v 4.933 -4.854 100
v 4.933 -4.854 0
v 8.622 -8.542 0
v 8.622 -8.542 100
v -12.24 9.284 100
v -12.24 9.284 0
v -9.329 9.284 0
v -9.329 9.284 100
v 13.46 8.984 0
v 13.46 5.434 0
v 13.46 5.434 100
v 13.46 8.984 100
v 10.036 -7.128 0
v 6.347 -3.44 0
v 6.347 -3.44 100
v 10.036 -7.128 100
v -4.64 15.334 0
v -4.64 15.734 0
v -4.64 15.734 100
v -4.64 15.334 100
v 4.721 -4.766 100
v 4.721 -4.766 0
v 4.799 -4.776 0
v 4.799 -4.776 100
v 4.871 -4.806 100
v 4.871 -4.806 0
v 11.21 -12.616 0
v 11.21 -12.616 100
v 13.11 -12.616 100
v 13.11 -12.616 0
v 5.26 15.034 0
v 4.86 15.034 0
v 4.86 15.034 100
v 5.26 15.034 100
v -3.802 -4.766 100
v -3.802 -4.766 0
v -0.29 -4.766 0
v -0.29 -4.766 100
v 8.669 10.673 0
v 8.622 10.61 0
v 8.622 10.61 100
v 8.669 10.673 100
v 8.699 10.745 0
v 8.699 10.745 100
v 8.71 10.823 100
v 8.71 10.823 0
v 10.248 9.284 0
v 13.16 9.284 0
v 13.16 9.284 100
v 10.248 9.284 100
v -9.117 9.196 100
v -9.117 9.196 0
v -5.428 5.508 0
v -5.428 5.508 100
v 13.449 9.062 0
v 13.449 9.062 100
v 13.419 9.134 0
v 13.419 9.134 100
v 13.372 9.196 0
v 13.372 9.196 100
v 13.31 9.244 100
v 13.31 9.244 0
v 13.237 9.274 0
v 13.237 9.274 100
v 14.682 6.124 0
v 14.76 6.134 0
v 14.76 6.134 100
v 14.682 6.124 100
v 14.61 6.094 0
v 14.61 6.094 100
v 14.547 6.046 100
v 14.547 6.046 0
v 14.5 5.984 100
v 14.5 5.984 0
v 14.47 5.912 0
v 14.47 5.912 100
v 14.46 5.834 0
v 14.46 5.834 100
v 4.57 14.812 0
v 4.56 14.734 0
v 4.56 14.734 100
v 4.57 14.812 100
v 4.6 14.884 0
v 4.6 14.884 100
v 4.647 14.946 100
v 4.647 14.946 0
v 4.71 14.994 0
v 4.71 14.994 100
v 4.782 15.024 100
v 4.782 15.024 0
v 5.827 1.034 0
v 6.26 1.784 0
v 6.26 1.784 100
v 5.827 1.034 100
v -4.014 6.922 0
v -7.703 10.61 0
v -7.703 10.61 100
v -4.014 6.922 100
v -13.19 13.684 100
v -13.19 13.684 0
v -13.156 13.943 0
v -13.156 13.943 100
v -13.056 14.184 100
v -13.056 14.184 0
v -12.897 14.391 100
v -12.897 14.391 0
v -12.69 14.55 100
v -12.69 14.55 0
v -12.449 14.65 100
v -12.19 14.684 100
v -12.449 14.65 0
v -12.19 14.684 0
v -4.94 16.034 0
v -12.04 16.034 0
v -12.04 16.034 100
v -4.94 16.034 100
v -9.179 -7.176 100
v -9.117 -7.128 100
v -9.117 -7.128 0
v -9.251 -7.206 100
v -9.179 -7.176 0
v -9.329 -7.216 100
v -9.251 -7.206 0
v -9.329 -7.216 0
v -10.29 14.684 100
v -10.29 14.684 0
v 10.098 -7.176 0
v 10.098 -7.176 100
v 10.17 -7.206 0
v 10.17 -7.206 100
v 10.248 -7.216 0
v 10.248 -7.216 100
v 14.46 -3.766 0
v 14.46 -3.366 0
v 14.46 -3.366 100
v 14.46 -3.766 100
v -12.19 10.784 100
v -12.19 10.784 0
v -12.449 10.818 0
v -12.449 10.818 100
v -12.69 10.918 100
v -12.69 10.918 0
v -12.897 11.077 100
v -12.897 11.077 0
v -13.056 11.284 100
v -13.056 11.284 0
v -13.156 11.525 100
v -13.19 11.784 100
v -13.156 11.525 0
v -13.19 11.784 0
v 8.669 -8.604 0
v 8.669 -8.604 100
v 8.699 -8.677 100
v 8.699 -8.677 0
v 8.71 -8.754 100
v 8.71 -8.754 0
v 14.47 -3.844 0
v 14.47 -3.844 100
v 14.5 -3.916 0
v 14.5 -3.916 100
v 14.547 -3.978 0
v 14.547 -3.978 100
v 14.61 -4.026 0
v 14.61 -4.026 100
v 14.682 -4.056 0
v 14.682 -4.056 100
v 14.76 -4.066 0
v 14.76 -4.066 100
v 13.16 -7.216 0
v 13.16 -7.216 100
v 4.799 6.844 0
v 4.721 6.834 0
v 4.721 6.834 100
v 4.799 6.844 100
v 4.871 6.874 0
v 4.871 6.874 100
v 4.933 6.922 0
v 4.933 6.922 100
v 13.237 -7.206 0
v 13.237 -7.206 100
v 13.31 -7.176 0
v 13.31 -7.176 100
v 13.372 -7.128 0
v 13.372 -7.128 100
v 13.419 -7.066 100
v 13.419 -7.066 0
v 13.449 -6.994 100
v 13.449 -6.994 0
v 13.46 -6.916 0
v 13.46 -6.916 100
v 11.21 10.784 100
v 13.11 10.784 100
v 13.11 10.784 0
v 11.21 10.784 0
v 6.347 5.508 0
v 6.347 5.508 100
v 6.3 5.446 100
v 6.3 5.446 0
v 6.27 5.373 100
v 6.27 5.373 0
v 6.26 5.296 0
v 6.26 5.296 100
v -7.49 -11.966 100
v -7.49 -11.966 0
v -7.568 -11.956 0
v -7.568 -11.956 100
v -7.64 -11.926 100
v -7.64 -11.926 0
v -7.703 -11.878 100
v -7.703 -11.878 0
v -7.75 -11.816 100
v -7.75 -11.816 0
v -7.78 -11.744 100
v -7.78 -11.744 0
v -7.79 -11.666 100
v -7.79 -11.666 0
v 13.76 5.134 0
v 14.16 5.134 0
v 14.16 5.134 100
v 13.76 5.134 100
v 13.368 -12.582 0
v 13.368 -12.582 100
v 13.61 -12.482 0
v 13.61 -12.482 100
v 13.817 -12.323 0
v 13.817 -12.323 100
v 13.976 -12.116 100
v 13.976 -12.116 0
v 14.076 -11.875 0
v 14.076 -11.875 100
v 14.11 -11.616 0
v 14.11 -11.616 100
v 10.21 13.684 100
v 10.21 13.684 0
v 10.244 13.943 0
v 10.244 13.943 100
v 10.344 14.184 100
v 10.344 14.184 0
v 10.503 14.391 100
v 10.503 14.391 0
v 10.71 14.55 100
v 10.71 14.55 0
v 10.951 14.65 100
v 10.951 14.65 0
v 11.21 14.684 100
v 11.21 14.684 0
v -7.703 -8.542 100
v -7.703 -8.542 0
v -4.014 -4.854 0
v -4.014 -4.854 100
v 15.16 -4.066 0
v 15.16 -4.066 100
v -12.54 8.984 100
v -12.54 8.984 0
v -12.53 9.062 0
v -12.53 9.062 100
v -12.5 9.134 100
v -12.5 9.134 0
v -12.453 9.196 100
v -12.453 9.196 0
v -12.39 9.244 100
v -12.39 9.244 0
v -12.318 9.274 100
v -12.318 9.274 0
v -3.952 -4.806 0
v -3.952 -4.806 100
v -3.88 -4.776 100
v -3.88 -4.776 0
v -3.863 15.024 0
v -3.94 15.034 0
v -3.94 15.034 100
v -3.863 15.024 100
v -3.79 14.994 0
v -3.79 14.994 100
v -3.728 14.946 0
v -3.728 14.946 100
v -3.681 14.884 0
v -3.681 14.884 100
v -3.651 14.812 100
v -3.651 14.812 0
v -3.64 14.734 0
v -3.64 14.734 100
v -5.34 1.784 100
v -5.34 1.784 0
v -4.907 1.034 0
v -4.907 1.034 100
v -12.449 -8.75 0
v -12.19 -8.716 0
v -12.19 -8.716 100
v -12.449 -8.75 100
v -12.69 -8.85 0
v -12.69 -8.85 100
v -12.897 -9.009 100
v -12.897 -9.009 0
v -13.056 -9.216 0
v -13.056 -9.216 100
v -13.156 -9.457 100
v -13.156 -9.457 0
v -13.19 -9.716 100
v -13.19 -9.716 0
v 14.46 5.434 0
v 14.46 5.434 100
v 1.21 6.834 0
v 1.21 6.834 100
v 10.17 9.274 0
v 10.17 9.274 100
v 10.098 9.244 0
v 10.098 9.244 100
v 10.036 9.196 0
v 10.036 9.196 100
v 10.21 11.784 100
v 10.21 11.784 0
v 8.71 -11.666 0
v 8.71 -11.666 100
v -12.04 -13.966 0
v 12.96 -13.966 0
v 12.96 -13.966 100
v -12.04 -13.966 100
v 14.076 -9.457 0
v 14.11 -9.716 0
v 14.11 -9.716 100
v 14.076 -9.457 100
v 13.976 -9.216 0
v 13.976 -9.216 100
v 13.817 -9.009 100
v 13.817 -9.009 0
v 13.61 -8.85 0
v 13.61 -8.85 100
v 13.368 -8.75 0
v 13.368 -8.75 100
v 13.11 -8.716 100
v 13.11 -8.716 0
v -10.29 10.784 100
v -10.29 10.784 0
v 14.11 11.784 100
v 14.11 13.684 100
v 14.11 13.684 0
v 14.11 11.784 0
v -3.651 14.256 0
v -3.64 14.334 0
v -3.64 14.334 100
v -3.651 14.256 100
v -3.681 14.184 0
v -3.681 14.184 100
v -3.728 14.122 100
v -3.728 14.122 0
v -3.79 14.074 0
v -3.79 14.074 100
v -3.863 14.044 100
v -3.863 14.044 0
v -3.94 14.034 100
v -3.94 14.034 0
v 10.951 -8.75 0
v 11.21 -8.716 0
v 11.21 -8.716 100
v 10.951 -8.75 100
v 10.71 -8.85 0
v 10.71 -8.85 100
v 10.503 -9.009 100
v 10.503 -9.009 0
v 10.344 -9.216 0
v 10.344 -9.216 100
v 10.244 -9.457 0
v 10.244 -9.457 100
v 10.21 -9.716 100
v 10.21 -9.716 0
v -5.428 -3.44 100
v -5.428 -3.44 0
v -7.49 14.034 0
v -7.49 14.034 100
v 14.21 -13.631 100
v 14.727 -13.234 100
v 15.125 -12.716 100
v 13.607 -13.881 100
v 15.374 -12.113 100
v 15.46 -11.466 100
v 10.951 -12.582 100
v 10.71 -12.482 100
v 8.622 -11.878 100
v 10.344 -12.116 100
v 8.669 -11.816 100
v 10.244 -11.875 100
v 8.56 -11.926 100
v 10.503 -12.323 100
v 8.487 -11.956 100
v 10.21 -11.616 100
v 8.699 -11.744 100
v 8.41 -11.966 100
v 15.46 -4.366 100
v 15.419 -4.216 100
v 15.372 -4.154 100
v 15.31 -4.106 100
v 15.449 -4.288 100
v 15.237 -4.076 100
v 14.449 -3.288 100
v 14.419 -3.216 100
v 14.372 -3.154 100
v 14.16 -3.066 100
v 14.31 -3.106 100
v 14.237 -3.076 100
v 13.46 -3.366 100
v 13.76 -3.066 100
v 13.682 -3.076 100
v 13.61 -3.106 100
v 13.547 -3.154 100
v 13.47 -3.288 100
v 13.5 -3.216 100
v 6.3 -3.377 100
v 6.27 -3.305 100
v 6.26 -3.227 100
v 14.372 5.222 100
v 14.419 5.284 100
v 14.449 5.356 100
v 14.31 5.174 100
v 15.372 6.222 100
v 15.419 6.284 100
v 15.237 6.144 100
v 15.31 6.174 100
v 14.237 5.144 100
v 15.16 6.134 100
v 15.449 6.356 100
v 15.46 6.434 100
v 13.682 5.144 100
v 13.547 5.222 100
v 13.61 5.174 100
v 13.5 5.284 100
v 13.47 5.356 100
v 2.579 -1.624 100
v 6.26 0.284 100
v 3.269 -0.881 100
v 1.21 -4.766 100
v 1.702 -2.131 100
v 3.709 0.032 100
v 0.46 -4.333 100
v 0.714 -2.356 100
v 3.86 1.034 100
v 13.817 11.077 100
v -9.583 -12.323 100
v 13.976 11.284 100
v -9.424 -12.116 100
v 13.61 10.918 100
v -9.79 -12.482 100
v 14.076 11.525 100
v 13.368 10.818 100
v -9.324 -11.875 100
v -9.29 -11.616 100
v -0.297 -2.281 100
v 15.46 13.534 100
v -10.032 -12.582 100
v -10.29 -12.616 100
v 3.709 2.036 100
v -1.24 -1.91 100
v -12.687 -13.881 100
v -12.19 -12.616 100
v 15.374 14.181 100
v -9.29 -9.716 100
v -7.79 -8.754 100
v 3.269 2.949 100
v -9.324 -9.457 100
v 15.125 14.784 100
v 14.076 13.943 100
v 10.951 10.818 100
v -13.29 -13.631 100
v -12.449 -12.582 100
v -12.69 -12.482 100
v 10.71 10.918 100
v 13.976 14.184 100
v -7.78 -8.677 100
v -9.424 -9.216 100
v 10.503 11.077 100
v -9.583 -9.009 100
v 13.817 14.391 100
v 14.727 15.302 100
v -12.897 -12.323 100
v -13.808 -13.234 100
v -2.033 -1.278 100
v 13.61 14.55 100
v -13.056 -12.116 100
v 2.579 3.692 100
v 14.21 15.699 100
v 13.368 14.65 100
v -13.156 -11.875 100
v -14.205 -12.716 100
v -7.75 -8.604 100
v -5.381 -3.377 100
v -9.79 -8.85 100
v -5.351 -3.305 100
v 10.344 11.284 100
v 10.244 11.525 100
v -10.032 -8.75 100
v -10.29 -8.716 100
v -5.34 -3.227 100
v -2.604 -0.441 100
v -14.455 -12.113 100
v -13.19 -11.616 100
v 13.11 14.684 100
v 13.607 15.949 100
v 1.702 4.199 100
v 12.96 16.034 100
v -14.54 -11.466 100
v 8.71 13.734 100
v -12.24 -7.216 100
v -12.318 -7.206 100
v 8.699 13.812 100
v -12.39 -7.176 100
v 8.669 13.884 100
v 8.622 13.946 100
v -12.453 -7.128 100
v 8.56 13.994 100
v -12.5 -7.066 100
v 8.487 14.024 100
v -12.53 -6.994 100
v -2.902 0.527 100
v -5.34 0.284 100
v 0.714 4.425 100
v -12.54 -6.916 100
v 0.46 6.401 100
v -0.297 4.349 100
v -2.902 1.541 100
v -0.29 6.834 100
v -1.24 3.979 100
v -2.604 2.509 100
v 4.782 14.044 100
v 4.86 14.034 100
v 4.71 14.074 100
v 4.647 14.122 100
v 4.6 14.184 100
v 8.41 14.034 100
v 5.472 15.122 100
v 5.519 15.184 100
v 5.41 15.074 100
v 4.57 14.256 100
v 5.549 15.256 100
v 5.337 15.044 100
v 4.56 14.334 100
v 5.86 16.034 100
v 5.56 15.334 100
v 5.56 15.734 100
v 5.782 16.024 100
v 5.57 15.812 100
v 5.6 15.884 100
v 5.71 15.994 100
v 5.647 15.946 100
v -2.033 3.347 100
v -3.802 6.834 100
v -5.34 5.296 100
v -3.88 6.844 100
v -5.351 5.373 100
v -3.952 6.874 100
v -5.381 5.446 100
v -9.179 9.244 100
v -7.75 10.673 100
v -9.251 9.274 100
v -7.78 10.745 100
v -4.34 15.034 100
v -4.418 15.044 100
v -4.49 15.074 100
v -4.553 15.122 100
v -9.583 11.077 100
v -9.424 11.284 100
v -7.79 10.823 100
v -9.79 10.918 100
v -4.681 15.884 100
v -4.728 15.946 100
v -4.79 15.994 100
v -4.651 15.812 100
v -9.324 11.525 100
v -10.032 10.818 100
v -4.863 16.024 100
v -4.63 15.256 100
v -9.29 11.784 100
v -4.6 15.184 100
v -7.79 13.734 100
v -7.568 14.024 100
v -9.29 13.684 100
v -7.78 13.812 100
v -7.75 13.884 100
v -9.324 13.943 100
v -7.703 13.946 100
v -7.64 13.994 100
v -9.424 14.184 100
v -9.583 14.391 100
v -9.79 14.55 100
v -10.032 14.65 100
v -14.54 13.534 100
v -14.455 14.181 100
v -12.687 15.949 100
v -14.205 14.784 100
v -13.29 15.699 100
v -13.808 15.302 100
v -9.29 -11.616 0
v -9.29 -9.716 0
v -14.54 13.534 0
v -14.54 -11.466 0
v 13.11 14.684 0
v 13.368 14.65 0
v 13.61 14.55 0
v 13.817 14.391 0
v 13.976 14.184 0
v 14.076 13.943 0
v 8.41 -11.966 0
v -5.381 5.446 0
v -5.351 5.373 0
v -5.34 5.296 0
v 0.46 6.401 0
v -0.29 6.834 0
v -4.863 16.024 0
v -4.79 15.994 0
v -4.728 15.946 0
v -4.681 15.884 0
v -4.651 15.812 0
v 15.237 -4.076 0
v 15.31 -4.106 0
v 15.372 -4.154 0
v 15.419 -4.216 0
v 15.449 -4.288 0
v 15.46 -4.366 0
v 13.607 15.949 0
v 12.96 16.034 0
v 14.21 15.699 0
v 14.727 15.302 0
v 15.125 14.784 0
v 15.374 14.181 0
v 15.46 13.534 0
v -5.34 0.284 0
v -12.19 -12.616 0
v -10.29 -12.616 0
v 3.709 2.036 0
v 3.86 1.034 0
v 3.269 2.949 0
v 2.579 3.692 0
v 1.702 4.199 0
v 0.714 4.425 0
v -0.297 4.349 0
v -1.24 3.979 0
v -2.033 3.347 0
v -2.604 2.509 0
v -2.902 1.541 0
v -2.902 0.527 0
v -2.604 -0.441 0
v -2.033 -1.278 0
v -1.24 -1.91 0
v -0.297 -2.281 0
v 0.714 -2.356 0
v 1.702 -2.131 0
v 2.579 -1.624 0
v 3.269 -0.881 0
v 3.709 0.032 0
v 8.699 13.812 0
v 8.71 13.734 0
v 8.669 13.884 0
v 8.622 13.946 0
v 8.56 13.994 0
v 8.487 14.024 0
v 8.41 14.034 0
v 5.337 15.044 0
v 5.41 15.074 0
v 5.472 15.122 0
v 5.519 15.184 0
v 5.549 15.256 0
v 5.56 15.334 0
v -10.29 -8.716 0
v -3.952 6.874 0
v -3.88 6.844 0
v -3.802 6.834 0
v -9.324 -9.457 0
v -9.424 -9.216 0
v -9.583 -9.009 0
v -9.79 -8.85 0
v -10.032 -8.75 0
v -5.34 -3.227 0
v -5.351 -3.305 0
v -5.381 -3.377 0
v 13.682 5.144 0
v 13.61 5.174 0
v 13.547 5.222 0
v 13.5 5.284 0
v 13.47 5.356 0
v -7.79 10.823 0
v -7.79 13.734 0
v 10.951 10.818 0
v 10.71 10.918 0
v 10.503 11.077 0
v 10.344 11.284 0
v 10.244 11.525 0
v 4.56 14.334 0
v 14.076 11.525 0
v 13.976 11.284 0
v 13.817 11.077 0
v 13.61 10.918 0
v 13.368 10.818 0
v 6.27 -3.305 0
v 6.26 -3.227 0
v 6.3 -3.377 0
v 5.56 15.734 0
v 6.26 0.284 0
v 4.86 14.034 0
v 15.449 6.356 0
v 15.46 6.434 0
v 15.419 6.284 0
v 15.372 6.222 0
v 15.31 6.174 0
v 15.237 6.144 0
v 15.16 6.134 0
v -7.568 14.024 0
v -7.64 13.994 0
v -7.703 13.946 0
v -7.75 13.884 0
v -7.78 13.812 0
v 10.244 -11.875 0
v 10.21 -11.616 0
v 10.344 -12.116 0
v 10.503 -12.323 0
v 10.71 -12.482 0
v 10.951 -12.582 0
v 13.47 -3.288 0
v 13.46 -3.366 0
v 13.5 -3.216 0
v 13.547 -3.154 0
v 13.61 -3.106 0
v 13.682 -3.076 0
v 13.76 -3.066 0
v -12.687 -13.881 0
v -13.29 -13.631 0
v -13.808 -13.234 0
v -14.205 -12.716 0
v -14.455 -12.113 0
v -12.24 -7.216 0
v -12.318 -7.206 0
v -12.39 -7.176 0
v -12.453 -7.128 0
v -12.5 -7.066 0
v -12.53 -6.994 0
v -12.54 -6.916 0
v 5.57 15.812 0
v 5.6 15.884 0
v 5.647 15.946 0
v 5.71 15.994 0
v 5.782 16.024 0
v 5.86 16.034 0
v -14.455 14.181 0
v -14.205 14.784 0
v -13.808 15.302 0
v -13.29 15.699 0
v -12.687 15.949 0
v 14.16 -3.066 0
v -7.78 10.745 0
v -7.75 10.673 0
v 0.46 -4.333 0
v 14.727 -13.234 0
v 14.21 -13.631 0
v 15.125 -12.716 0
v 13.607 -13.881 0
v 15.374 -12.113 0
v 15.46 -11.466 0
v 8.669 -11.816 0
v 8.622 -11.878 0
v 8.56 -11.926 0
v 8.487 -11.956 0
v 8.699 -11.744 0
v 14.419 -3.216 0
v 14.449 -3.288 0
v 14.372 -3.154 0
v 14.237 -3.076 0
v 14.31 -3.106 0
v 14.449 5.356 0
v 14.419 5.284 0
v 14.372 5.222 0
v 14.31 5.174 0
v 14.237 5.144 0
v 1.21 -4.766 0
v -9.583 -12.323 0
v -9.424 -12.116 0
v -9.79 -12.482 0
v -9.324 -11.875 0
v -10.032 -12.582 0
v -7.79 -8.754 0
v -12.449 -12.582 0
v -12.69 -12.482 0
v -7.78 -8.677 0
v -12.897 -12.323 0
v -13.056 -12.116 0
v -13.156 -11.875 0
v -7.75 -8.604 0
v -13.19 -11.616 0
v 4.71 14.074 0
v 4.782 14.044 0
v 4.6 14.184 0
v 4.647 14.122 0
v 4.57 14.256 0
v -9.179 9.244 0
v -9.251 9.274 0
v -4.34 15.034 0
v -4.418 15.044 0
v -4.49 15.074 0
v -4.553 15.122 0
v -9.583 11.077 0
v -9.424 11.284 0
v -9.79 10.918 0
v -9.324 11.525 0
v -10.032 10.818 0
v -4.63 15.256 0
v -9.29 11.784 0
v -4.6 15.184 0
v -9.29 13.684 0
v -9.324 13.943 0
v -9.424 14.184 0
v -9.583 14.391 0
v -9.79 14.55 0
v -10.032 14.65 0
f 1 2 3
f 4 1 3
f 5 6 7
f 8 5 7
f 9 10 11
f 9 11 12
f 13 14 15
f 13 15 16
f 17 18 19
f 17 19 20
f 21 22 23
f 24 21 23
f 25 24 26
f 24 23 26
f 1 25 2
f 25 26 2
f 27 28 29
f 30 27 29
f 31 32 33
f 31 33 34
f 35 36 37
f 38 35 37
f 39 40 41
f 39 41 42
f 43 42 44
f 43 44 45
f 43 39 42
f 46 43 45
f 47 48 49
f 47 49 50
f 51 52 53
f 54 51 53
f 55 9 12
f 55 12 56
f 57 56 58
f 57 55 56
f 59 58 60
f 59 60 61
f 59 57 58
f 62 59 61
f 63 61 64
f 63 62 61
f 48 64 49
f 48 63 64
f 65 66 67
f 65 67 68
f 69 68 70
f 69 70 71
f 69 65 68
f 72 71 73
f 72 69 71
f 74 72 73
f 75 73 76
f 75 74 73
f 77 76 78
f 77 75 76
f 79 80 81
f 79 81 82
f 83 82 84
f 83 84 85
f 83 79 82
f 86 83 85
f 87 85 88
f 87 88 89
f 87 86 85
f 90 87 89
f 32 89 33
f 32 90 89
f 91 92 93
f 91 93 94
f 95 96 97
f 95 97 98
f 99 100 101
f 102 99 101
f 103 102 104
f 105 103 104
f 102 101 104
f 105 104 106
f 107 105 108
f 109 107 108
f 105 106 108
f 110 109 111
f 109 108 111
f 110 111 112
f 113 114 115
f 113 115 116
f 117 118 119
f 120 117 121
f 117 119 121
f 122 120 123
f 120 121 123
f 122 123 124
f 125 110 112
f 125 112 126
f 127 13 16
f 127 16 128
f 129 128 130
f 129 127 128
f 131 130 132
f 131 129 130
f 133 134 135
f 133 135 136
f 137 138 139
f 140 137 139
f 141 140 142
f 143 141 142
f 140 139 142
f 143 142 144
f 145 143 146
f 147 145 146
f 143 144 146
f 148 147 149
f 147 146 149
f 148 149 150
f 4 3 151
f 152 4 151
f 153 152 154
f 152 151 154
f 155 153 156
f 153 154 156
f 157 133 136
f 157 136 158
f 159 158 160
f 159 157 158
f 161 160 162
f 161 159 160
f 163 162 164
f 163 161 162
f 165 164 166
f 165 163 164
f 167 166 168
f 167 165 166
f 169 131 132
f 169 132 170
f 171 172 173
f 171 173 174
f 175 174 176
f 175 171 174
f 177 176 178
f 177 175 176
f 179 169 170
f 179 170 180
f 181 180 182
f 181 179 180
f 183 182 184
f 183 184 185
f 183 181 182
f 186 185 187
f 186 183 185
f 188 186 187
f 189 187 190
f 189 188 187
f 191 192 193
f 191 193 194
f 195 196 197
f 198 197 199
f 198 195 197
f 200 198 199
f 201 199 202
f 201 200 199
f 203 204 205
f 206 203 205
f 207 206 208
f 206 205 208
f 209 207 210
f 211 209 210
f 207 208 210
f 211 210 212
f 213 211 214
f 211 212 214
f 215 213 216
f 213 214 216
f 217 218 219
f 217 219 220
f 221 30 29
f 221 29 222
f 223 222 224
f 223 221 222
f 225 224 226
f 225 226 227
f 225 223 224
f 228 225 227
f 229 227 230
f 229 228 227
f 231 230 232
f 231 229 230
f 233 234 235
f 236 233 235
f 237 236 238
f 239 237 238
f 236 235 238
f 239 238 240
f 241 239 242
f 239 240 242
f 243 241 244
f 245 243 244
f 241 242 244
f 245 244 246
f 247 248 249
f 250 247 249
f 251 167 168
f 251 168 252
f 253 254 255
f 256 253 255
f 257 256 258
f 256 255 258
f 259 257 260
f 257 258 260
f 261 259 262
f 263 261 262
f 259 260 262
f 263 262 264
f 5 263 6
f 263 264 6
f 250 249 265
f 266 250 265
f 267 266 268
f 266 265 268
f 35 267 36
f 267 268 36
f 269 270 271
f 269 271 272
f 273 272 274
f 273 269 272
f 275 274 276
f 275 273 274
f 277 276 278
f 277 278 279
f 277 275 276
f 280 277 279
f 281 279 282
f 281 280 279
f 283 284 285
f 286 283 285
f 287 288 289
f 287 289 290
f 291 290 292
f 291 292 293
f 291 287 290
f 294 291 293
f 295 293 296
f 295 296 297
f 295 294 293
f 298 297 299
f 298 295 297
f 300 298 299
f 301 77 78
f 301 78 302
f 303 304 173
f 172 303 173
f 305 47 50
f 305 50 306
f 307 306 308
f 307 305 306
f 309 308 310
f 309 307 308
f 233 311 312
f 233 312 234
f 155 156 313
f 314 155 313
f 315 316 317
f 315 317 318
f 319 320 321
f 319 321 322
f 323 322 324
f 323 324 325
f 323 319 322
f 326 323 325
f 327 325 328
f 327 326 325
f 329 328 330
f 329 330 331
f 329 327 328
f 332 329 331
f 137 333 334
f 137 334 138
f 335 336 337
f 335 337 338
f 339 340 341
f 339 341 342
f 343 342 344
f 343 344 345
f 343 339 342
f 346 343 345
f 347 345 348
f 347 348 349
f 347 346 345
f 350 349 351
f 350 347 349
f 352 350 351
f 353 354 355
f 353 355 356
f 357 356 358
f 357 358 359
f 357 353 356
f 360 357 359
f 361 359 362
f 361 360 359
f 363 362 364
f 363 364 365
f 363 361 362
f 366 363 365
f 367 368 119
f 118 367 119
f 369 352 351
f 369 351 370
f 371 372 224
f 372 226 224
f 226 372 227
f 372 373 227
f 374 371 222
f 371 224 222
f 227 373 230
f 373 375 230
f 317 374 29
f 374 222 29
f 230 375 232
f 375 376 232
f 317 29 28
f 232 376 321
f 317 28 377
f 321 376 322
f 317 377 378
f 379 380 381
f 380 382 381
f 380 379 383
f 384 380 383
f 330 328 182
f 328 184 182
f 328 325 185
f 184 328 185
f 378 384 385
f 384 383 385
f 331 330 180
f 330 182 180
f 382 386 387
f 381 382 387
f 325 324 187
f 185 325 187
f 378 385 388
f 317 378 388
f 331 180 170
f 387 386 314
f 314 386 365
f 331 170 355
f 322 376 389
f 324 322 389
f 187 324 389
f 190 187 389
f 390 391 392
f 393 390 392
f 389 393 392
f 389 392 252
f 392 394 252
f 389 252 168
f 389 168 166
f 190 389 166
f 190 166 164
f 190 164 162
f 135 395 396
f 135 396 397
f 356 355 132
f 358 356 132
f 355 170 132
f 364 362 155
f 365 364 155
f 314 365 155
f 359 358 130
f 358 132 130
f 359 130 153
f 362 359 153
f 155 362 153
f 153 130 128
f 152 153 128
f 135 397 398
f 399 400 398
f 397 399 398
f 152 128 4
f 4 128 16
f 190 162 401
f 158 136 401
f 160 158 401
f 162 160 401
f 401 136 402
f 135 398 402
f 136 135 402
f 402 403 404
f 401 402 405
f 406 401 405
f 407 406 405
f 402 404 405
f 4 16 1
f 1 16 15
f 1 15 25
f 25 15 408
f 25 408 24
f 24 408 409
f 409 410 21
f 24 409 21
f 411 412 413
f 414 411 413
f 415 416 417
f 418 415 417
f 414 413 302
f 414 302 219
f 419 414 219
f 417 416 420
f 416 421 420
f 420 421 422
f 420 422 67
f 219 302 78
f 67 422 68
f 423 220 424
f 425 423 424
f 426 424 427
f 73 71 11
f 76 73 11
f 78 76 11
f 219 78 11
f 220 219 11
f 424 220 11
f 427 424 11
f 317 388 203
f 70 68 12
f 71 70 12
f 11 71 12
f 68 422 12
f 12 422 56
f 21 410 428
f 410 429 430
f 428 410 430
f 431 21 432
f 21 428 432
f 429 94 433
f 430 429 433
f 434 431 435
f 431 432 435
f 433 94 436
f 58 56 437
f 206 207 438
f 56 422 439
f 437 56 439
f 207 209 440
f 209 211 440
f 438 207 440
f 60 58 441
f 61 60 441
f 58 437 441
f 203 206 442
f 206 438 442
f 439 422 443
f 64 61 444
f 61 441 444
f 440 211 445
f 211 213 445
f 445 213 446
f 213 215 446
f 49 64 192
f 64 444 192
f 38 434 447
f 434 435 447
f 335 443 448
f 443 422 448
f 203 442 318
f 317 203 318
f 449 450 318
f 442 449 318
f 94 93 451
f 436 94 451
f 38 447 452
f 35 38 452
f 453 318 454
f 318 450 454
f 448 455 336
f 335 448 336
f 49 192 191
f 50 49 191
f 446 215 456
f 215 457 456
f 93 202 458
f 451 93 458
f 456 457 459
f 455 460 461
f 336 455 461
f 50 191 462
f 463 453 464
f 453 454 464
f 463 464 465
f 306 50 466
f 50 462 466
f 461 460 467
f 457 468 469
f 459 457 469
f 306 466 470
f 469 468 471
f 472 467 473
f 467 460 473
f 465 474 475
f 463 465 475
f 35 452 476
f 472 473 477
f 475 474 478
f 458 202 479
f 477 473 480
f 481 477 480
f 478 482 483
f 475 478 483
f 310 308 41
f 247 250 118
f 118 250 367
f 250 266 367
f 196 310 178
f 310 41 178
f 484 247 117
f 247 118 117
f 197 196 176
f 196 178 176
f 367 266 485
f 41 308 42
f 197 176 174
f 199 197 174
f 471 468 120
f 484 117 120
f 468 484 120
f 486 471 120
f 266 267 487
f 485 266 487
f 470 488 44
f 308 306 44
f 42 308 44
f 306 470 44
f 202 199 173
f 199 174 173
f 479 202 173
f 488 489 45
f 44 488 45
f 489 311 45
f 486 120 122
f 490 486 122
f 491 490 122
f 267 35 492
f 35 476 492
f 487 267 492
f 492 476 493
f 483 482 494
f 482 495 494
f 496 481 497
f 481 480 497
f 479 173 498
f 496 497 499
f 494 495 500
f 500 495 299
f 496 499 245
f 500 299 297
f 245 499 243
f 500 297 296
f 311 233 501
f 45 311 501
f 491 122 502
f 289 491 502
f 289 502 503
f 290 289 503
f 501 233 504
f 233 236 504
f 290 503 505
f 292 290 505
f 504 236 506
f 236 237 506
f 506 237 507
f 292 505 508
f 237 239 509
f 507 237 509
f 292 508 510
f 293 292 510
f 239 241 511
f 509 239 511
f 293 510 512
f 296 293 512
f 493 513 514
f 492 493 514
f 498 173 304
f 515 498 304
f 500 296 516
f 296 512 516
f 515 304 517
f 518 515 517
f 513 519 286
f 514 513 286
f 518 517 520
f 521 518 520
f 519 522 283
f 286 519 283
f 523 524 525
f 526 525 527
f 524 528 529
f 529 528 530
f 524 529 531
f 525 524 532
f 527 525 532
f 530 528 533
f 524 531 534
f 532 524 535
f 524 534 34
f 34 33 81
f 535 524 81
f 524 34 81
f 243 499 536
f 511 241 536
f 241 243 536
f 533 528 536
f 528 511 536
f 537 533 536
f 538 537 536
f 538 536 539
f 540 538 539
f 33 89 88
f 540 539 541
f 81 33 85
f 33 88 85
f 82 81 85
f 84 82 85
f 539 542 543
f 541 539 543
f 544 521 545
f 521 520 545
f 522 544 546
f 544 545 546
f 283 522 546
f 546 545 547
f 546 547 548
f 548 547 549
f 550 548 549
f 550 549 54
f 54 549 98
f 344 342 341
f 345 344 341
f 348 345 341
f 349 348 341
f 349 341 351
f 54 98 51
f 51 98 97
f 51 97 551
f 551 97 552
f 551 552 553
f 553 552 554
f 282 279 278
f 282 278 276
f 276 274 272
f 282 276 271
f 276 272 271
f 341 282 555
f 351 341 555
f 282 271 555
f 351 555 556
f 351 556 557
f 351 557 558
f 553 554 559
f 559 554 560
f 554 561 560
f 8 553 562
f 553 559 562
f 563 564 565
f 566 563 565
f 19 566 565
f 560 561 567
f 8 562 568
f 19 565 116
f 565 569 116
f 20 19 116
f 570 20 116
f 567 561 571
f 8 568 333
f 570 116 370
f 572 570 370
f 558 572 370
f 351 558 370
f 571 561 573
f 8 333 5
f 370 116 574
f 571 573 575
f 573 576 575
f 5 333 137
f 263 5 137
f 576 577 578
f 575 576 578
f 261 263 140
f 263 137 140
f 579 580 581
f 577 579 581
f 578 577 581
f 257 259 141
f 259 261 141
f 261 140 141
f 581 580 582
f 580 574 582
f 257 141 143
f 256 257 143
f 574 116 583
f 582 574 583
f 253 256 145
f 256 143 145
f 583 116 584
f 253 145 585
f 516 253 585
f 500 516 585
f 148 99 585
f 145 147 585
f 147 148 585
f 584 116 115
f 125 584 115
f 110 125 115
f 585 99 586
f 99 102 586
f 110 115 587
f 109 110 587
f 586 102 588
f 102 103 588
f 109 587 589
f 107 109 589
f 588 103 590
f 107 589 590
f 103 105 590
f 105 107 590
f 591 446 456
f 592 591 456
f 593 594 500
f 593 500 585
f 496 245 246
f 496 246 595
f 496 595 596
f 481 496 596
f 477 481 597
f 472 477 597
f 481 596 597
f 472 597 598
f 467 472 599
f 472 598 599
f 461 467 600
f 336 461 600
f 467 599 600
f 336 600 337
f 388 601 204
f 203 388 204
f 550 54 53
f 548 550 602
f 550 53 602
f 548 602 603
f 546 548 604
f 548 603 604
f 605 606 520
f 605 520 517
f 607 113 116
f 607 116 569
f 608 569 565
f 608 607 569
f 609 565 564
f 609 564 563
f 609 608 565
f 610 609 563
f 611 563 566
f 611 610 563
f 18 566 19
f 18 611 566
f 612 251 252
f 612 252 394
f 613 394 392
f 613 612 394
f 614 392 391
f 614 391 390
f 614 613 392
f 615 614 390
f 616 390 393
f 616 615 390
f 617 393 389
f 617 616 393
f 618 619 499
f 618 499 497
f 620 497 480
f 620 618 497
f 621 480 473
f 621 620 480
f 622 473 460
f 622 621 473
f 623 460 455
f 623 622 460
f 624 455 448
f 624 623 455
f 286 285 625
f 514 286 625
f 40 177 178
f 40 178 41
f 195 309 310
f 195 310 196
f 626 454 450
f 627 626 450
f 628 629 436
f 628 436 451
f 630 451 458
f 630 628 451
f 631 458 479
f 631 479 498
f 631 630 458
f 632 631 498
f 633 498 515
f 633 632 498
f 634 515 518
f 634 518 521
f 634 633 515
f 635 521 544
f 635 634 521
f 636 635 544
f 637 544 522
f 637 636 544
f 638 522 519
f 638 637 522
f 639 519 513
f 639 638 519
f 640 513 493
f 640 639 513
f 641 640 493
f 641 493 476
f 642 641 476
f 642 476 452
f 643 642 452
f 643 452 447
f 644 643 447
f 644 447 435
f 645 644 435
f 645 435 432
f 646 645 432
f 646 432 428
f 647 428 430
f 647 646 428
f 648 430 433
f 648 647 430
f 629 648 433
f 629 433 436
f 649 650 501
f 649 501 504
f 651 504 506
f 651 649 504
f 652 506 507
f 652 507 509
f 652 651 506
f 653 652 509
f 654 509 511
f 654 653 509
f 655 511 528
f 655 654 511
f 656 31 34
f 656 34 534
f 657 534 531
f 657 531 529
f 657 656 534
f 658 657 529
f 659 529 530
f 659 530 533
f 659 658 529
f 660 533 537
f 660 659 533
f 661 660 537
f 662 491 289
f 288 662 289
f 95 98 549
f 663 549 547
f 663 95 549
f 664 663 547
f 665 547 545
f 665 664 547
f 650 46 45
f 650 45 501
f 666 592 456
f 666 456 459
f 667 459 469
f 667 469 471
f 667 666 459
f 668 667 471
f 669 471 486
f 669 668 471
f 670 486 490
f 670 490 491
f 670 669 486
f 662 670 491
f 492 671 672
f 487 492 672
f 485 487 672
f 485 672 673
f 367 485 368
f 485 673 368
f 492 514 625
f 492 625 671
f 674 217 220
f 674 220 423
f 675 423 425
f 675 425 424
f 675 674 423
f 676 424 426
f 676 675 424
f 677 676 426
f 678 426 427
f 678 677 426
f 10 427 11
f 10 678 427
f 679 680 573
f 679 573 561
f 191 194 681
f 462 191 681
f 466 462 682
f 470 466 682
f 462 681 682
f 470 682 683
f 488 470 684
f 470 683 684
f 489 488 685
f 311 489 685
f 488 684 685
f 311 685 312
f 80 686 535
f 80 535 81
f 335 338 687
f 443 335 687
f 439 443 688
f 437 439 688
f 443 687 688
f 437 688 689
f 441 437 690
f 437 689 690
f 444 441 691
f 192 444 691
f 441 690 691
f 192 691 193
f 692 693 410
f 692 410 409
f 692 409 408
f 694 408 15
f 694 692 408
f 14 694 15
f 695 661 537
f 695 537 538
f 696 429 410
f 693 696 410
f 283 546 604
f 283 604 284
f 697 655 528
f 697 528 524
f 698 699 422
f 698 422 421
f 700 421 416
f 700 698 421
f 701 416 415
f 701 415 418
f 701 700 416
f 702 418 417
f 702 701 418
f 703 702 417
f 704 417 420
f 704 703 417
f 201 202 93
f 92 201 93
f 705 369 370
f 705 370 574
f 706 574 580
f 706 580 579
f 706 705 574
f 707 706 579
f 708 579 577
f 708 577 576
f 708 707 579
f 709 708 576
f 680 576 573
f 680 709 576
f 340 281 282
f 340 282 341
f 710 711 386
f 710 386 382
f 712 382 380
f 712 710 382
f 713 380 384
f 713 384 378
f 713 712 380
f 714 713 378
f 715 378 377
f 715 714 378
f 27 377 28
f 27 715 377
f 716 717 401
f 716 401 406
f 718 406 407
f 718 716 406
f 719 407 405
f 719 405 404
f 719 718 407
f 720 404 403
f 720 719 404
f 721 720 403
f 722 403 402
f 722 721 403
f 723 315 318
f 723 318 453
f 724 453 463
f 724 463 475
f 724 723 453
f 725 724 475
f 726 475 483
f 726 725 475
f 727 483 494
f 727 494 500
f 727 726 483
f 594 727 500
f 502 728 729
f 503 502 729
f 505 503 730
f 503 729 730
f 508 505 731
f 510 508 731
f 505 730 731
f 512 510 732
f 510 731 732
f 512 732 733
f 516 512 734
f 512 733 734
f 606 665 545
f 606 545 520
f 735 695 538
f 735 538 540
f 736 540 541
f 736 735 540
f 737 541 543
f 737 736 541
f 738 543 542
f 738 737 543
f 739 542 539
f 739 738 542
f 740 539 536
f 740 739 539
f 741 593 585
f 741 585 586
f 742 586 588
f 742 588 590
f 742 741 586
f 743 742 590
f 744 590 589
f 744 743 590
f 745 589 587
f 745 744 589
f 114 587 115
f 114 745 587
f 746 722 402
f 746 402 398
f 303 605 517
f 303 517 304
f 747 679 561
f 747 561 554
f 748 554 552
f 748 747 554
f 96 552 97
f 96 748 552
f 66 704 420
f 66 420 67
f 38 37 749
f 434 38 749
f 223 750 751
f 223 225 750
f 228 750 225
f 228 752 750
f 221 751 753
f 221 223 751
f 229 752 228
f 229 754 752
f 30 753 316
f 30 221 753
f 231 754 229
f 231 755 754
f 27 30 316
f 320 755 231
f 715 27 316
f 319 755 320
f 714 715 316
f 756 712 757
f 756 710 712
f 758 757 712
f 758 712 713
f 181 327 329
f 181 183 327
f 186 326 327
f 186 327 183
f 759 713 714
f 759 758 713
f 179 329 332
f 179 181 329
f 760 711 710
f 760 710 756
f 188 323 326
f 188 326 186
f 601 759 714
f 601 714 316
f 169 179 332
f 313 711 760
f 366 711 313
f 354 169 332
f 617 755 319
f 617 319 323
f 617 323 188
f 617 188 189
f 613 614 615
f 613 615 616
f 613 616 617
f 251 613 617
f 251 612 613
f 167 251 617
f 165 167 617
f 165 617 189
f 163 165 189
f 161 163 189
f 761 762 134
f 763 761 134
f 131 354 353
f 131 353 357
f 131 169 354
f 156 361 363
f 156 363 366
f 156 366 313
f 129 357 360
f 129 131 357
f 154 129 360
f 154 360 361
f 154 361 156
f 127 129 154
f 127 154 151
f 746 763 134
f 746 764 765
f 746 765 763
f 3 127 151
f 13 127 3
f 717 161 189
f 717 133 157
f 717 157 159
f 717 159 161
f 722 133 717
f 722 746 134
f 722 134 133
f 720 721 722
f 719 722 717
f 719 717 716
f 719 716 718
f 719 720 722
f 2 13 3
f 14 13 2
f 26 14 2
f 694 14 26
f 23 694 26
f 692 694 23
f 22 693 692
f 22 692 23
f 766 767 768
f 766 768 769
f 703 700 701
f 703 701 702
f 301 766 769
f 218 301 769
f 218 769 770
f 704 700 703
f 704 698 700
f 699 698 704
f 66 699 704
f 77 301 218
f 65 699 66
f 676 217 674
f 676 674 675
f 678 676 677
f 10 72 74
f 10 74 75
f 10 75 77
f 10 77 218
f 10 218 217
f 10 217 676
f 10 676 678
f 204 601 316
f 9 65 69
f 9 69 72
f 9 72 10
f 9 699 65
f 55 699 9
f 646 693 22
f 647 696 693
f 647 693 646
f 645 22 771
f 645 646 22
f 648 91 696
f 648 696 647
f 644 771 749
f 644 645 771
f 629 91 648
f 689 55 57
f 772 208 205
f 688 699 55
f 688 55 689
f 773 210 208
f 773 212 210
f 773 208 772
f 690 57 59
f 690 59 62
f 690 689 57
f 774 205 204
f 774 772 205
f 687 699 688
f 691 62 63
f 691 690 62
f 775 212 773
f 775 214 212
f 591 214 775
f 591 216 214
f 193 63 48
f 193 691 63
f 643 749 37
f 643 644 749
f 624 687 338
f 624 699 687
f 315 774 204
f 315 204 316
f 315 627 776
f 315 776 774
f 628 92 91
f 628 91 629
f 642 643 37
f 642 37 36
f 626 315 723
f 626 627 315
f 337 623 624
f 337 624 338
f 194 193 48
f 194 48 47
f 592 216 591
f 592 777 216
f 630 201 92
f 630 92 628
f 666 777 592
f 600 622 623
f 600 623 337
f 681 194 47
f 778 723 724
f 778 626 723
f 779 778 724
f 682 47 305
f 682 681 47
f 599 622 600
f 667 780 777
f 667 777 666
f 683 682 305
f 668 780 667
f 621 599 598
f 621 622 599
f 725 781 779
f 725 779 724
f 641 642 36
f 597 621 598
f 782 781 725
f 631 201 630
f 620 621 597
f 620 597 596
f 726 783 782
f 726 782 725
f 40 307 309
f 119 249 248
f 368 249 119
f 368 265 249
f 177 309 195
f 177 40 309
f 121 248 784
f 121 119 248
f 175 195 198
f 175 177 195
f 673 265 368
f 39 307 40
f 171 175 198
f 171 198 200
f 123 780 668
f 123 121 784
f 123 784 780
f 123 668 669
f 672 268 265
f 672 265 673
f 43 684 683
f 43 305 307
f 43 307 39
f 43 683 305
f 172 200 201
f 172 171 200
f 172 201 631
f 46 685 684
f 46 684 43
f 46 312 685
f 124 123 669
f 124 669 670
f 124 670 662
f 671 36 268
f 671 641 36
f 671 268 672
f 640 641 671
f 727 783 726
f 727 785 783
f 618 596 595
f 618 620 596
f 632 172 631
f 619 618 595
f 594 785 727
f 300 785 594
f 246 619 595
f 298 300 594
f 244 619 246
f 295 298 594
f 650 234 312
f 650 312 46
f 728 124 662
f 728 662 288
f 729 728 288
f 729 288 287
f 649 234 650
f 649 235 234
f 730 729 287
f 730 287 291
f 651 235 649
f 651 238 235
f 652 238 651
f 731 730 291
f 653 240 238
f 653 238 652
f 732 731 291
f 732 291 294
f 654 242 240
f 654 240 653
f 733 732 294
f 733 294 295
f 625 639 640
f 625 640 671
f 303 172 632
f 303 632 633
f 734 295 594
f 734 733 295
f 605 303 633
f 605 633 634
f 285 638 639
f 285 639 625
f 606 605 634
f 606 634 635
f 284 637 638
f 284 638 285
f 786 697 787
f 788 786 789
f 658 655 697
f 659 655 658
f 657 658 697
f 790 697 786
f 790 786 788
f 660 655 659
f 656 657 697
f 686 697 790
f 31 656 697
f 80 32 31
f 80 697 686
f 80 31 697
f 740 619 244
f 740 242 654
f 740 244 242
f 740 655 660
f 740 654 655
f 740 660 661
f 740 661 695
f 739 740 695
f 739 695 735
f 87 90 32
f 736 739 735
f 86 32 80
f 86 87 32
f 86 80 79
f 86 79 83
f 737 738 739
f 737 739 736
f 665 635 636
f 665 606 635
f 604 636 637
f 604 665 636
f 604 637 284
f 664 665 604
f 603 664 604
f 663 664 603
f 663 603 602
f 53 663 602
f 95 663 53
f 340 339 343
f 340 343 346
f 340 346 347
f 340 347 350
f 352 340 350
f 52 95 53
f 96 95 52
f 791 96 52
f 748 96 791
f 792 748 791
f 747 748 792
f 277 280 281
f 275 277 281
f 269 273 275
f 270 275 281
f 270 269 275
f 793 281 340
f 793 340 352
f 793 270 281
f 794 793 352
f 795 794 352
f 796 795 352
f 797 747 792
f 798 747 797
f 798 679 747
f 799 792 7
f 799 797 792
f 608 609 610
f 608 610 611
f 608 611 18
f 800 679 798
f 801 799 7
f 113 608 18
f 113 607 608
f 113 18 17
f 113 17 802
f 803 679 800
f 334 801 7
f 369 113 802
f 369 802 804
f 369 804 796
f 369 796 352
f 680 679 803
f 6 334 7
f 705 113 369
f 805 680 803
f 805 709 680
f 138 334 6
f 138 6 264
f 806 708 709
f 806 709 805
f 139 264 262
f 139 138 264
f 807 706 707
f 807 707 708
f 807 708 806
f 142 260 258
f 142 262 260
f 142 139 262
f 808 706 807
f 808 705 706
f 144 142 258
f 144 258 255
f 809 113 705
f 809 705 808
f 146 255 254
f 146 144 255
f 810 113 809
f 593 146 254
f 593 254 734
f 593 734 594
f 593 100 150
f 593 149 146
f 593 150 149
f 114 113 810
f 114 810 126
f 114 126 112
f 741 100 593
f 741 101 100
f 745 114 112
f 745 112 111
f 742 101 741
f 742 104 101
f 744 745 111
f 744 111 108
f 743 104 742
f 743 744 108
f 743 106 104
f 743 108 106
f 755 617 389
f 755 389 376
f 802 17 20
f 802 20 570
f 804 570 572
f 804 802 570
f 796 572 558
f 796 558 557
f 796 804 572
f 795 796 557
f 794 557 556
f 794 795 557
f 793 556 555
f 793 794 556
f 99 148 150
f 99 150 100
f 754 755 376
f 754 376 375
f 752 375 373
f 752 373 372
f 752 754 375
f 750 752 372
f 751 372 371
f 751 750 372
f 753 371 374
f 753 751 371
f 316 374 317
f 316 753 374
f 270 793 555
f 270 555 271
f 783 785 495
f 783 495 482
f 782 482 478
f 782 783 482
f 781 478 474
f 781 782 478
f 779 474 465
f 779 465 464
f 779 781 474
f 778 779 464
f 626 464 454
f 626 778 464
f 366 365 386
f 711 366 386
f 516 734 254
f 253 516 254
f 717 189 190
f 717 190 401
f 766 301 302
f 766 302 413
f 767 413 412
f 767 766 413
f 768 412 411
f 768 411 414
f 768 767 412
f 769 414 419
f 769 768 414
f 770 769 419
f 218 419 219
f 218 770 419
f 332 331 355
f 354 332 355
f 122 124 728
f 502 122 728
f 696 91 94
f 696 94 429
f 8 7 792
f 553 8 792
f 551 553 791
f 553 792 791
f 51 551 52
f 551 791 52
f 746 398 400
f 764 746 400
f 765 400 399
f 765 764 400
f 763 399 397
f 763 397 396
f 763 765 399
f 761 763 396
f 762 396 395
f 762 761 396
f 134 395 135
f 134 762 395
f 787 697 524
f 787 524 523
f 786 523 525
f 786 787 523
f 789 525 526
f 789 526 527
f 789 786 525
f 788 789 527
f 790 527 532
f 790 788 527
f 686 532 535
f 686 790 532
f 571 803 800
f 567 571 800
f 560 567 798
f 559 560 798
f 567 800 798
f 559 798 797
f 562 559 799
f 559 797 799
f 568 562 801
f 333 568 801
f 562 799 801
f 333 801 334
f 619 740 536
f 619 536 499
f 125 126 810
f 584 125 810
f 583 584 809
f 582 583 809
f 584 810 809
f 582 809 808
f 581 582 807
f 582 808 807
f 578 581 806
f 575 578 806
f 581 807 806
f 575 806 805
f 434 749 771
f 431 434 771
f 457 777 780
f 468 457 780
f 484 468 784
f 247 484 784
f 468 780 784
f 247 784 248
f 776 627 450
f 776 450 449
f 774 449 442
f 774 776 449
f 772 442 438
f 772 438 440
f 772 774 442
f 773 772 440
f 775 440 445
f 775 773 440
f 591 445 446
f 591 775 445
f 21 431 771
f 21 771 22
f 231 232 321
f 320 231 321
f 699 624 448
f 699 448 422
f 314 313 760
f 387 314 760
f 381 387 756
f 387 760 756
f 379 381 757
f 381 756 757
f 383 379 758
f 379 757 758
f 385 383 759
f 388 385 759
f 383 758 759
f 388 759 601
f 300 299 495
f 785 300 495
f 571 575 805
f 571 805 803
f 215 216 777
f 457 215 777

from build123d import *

# Parameters (mm, degrees)
SKETCH_1_R      = 3.4
EXTRUDE_1_DEPTH = 100


with BuildPart() as part:
    # 草图1 → 凸台-拉伸1 (new body)
    with BuildSketch(Plane.XY):
        with BuildLine():
            Line((5.859616846, 16.034137905), (12.959616847, 16.034137905))
            ThreePointArc((12.959616847, 16.034137905), (14.7273838, 15.301904858), (15.459616847, 13.534137905))
            Line((15.459616847, 13.534137905), (15.459616847, 6.434137905))
            ThreePointArc((15.459616847, 6.434137905), (15.371748881, 6.222005871), (15.159616847, 6.134137905))
            Line((15.159616847, 6.134137905), (14.759616847, 6.134137905))
            ThreePointArc((14.759616847, 6.134137905), (14.547484812, 6.046269939), (14.459616847, 5.834137905))
            Line((14.459616847, 5.834137905), (14.459616847, 5.434137905))
            ThreePointArc((14.459616847, 5.434137905), (14.371748881, 5.222005871), (14.159616847, 5.134137905))
            Line((14.159616847, 5.134137905), (13.759616847, 5.134137905))
            ThreePointArc((13.759616847, 5.134137905), (13.547484812, 5.222005871), (13.459616847, 5.434137905))
            Line((13.459616847, 5.434137905), (13.459616847, 8.984137905))
            ThreePointArc((13.459616847, 8.984137905), (13.371748881, 9.196269939), (13.159616847, 9.284137905))
            Line((13.159616847, 9.284137905), (10.248094478, 9.284137905))
            ThreePointArc((10.248094478, 9.284137905), (10.133289448, 9.261301765), (10.035962443, 9.196269939))
            Line((10.035962443, 9.196269939), (6.347484812, 5.507792308))
            ThreePointArc((6.347484812, 5.507792308), (6.282452987, 5.410465304), (6.259616847, 5.295660274))
            Line((6.259616847, 5.295660274), (6.259616847, 1.784137905))
            Line((6.259616847, 1.784137905), (5.826604145, 1.034137905))
            Line((5.826604145, 1.034137905), (6.259616847, 0.284137905))
            Line((6.259616847, 0.284137905), (6.259616847, -3.227384464))
            ThreePointArc((6.259616847, -3.227384464), (6.282452987, -3.342189494), (6.347484812, -3.439516498))
            Line((6.347484812, -3.439516498), (10.035962443, -7.127994129))
            ThreePointArc((10.035962443, -7.127994129), (10.133289448, -7.193025955), (10.248094478, -7.215862095))
            Line((10.248094478, -7.215862095), (13.159616847, -7.215862095))
            ThreePointArc((13.159616847, -7.215862095), (13.371748881, -7.127994129), (13.459616847, -6.915862095))
            Line((13.459616847, -6.915862095), (13.459616847, -3.365862095))
            ThreePointArc((13.459616847, -3.365862095), (13.547484812, -3.153730061), (13.759616847, -3.065862095))
            Line((13.759616847, -3.065862095), (14.159616847, -3.065862095))
            ThreePointArc((14.159616847, -3.065862095), (14.371748881, -3.153730061), (14.459616847, -3.365862095))
            Line((14.459616847, -3.365862095), (14.459616847, -3.765862095))
            ThreePointArc((14.459616847, -3.765862095), (14.547484812, -3.977994129), (14.759616847, -4.065862095))
            Line((14.759616847, -4.065862095), (15.159616847, -4.065862095))
            ThreePointArc((15.159616847, -4.065862095), (15.371748881, -4.153730061), (15.459616847, -4.365862095))
            Line((15.459616847, -4.365862095), (15.459616847, -11.465862095))
            ThreePointArc((15.459616847, -11.465862095), (14.7273838, -13.233629048), (12.959616847, -13.965862095))
            Line((12.959616847, -13.965862095), (-12.040383153, -13.965862095))
            ThreePointArc((-12.040383153, -13.965862095), (-13.808150106, -13.233629048), (-14.540383153, -11.465862095))
            Line((-14.540383153, -11.465862095), (-14.540383153, 13.534137905))
            ThreePointArc((-14.540383153, 13.534137905), (-13.808150106, 15.301904858), (-12.040383153, 16.034137905))
            Line((-12.040383153, 16.034137905), (-4.940383153, 16.034137905))
            ThreePointArc((-4.940383153, 16.034137905), (-4.728251119, 15.94626994), (-4.640383153, 15.734137905))
            Line((-4.640383153, 15.734137905), (-4.640383153, 15.334137905))
            ThreePointArc((-4.640383153, 15.334137905), (-4.552515188, 15.122005871), (-4.340383153, 15.034137905))
            Line((-4.340383153, 15.034137905), (-3.940383153, 15.034137905))
            ThreePointArc((-3.940383153, 15.034137905), (-3.728251119, 14.946269939), (-3.640383153, 14.734137905))
            Line((-3.640383153, 14.734137905), (-3.640383153, 14.334137905))
            ThreePointArc((-3.640383153, 14.334137905), (-3.728251119, 14.122005871), (-3.940383153, 14.034137905))
            Line((-3.940383153, 14.034137905), (-7.490383153, 14.034137905))
            ThreePointArc((-7.490383153, 14.034137905), (-7.702515188, 13.946269939), (-7.790383153, 13.734137905))
            Line((-7.790383153, 13.734137905), (-7.790383153, 10.822615536))
            ThreePointArc((-7.790383153, 10.822615536), (-7.767547013, 10.707810506), (-7.702515188, 10.610483502))
            Line((-7.702515188, 10.610483502), (-4.014037557, 6.922005871))
            ThreePointArc((-4.014037557, 6.922005871), (-3.916710552, 6.856974045), (-3.801905522, 6.834137905))
            Line((-3.801905522, 6.834137905), (-0.290383153, 6.834137905))
            Line((-0.290383153, 6.834137905), (0.459616847, 6.401125203))
            Line((0.459616847, 6.401125203), (1.209616847, 6.834137905))
            Line((1.209616847, 6.834137905), (4.721139216, 6.834137905))
            ThreePointArc((4.721139216, 6.834137905), (4.835944245, 6.856974045), (4.93327125, 6.922005871))
            Line((4.93327125, 6.922005871), (8.621748881, 10.610483502))
            ThreePointArc((8.621748881, 10.610483502), (8.686780706, 10.707810507), (8.709616847, 10.822615536))
            Line((8.709616847, 10.822615536), (8.709616847, 13.734137905))
            ThreePointArc((8.709616847, 13.734137905), (8.621748881, 13.946269939), (8.409616847, 14.034137905))
            Line((8.409616847, 14.034137905), (4.859616847, 14.034137905))
            ThreePointArc((4.859616847, 14.034137905), (4.647484812, 14.122005871), (4.559616847, 14.334137905))
            Line((4.559616847, 14.334137905), (4.559616847, 14.734137905))
            ThreePointArc((4.559616847, 14.734137905), (4.647484812, 14.946269939), (4.859616847, 15.034137905))
            Line((4.859616847, 15.034137905), (5.259616847, 15.034137905))
            ThreePointArc((5.259616847, 15.034137905), (5.471748881, 15.122005871), (5.559616847, 15.334137905))
            Line((5.559616847, 15.334137905), (5.559616847, 15.734137905))
            ThreePointArc((5.559616847, 15.734137905), (5.647484812, 15.94626994), (5.859616846, 16.034137905))
        make_face()
        with Locations((0.459616847, 1.034137905)):
            Circle(SKETCH_1_R, mode=Mode.SUBTRACT)
        with BuildLine():
            Line((8.409616847, -11.965862095), (-7.490383153, -11.965862095))
            ThreePointArc((-7.490383153, -11.965862095), (-7.702515188, -11.877994129), (-7.790383153, -11.665862095))
            Line((-7.790383153, -11.665862095), (-7.790383153, -8.754339726))
            ThreePointArc((-7.790383153, -8.754339726), (-7.767547013, -8.639534696), (-7.702515188, -8.542207692))
            Line((-7.702515188, -8.542207692), (-4.014037557, -4.853730061))
            ThreePointArc((-4.014037557, -4.853730061), (-3.916710552, -4.788698235), (-3.801905522, -4.765862095))
            Line((-3.801905522, -4.765862095), (-0.290383153, -4.765862095))
            Line((-0.290383153, -4.765862095), (0.459616847, -4.332849393))
            Line((0.459616847, -4.332849393), (1.209616847, -4.765862095))
            Line((1.209616847, -4.765862095), (4.721139216, -4.765862095))
            ThreePointArc((4.721139216, -4.765862095), (4.835944245, -4.788698235), (4.93327125, -4.853730061))
            Line((4.93327125, -4.853730061), (8.621748881, -8.542207692))
            ThreePointArc((8.621748881, -8.542207692), (8.686780706, -8.639534696), (8.709616847, -8.754339726))
            Line((8.709616847, -8.754339726), (8.709616847, -11.665862095))
            ThreePointArc((8.709616847, -11.665862095), (8.621748881, -11.877994129), (8.409616847, -11.965862095))
        make_face(mode=Mode.SUBTRACT)
        with BuildLine():
            Line((-10.290383153, -8.715862095), (-12.190383153, -8.715862095))
            ThreePointArc((-12.190383153, -8.715862095), (-12.897489934, -9.008755314), (-13.190383153, -9.715862095))
            Line((-13.190383153, -9.715862095), (-13.190383153, -11.615862095))
            ThreePointArc((-13.190383153, -11.615862095), (-12.897489934, -12.322968876), (-12.190383153, -12.615862095))
            Line((-12.190383153, -12.615862095), (-10.290383153, -12.615862095))
            ThreePointArc((-10.290383153, -12.615862095), (-9.583276372, -12.322968876), (-9.290383153, -11.615862095))
            Line((-9.290383153, -11.615862095), (-9.290383153, -9.715862095))
            ThreePointArc((-9.290383153, -9.715862095), (-9.583276372, -9.008755314), (-10.290383153, -8.715862095))
        make_face(mode=Mode.SUBTRACT)
        with BuildLine():
            Line((-9.290383153, 13.684137905), (-9.290383153, 11.784137905))
            ThreePointArc((-9.290383153, 11.784137905), (-9.583276372, 11.077031124), (-10.290383153, 10.784137905))
            Line((-10.290383153, 10.784137905), (-12.190383153, 10.784137905))
            ThreePointArc((-12.190383153, 10.784137905), (-12.897489934, 11.077031124), (-13.190383153, 11.784137905))
            Line((-13.190383153, 11.784137905), (-13.190383153, 13.684137905))
            ThreePointArc((-13.190383153, 13.684137905), (-12.897489934, 14.391244686), (-12.190383153, 14.684137905))
            Line((-12.190383153, 14.684137905), (-10.290383153, 14.684137905))
            ThreePointArc((-10.290383153, 14.684137905), (-9.583276372, 14.391244686), (-9.290383153, 13.684137905))
        make_face(mode=Mode.SUBTRACT)
        with BuildLine():
            Line((13.109616847, 10.784137905), (11.209616847, 10.784137905))
            ThreePointArc((11.209616847, 10.784137905), (10.502510066, 11.077031124), (10.209616847, 11.784137905))
            Line((10.209616847, 11.784137905), (10.209616847, 13.684137905))
            ThreePointArc((10.209616847, 13.684137905), (10.502510066, 14.391244686), (11.209616847, 14.684137905))
            Line((11.209616847, 14.684137905), (13.109616847, 14.684137905))
            ThreePointArc((13.109616847, 14.684137905), (13.816723628, 14.391244686), (14.109616847, 13.684137905))
            Line((14.109616847, 13.684137905), (14.109616847, 11.784137905))
            ThreePointArc((14.109616847, 11.784137905), (13.816723628, 11.077031124), (13.109616847, 10.784137905))
        make_face(mode=Mode.SUBTRACT)
        with BuildLine():
            Line((-5.340383153, 5.295660274), (-5.340383153, 1.784137905))
            Line((-5.340383153, 1.784137905), (-4.907370451, 1.034137905))
            Line((-4.907370451, 1.034137905), (-5.340383153, 0.284137905))
            Line((-5.340383153, 0.284137905), (-5.340383153, -3.227384464))
            ThreePointArc((-5.340383153, -3.227384464), (-5.363219294, -3.342189494), (-5.428251119, -3.439516498))
            Line((-5.428251119, -3.439516498), (-9.11672875, -7.127994129))
            ThreePointArc((-9.11672875, -7.127994129), (-9.214055755, -7.193025955), (-9.328860784, -7.215862095))
            Line((-9.328860784, -7.215862095), (-12.240383153, -7.215862095))
            ThreePointArc((-12.240383153, -7.215862095), (-12.452515188, -7.127994129), (-12.540383153, -6.915862095))
            Line((-12.540383153, -6.915862095), (-12.540383153, 8.984137905))
            ThreePointArc((-12.540383153, 8.984137905), (-12.452515188, 9.196269939), (-12.240383153, 9.284137905))
            Line((-12.240383153, 9.284137905), (-9.328860784, 9.284137905))
            ThreePointArc((-9.328860784, 9.284137905), (-9.214055755, 9.261301765), (-9.11672875, 9.196269939))
            Line((-9.11672875, 9.196269939), (-5.428251119, 5.507792308))
            ThreePointArc((-5.428251119, 5.507792308), (-5.363219294, 5.410465304), (-5.340383153, 5.295660274))
        make_face(mode=Mode.SUBTRACT)
        with BuildLine():
            Line((14.109616847, -11.615862095), (14.109616847, -9.715862095))
            ThreePointArc((14.109616847, -9.715862095), (13.816723628, -9.008755314), (13.109616847, -8.715862095))
            Line((13.109616847, -8.715862095), (11.209616847, -8.715862095))
            ThreePointArc((11.209616847, -8.715862095), (10.502510066, -9.008755314), (10.209616847, -9.715862095))
            Line((10.209616847, -9.715862095), (10.209616847, -11.615862095))
            ThreePointArc((10.209616847, -11.615862095), (10.502510066, -12.322968876), (11.209616847, -12.615862095))
            Line((11.209616847, -12.615862095), (13.109616847, -12.615862095))
            ThreePointArc((13.109616847, -12.615862095), (13.816723628, -12.322968876), (14.109616847, -11.615862095))
        make_face(mode=Mode.SUBTRACT)
    extrude(amount=EXTRUDE_1_DEPTH)


solid = part.part
